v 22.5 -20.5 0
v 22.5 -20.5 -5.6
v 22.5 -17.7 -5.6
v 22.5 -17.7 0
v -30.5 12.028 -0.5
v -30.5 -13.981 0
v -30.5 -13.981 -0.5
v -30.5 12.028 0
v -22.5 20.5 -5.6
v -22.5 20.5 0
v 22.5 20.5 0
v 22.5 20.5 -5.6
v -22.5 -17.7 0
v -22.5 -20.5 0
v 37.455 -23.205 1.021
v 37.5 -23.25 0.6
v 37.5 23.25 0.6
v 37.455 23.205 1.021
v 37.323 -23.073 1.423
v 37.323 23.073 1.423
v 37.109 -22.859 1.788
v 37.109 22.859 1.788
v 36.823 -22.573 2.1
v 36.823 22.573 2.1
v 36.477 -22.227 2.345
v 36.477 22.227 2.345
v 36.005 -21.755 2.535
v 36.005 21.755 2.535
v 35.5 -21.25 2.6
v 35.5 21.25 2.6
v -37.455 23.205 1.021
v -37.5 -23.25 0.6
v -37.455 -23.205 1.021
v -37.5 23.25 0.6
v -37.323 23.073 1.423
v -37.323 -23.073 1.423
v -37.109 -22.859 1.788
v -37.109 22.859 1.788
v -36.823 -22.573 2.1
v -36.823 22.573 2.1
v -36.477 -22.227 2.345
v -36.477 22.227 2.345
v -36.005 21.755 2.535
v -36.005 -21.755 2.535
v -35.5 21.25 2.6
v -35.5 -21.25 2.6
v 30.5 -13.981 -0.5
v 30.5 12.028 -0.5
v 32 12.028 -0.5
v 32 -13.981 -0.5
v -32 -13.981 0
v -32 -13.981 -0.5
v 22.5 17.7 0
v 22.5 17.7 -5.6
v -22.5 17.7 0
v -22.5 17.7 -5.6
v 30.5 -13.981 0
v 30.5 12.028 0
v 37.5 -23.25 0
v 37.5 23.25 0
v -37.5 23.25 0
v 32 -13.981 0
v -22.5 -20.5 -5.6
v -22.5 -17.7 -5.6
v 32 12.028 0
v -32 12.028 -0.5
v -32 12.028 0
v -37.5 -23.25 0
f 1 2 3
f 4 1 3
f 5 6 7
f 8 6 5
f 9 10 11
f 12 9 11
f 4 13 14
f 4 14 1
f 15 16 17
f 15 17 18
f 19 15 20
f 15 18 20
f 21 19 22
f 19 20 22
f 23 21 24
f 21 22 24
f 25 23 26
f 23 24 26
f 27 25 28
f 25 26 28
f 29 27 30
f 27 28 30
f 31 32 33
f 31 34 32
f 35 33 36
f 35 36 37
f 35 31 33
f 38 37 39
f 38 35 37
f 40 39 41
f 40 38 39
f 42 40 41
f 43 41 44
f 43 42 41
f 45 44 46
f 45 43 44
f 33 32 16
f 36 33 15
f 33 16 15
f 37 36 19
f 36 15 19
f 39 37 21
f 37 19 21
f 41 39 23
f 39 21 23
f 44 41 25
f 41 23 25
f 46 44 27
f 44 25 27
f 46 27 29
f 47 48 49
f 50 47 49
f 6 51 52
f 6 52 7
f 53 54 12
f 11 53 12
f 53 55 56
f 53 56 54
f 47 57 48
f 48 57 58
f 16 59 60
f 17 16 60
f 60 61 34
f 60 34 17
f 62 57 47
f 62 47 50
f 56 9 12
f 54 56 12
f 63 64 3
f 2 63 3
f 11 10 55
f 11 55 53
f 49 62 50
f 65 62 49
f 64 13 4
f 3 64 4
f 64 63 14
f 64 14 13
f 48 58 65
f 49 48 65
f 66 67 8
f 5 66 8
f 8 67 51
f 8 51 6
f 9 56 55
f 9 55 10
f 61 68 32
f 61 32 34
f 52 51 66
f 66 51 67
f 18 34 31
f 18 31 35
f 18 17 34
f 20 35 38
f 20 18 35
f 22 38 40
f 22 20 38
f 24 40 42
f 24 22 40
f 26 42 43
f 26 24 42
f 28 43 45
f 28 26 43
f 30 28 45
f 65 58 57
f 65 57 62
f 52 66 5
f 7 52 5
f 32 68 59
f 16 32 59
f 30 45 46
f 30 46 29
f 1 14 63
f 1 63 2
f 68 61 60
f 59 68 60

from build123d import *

# Parameters (mm, degrees)
F0_W     = 75
F0_H     = 46.5
F0_W_2   = 1.5
F0_H_2   = 26.009672
F0_W_3   = 45
F0_H_3   = 2.8
F0_H_4   = 35.4
F1_DEPTH = 2.6
F2_DEPTH = 5.6
F3_DEPTH = 0.5
F4_R     = 2


with BuildPart() as f1:
    # F0 (on Top) → F1 (new body)
    with BuildSketch(Plane.XY):
        Rectangle(F0_W, F0_H)
        with Locations((-31.25, -0.976509)):
            Rectangle(F0_W_2, F0_H_2, mode=Mode.SUBTRACT)
        with Locations((31.25, -0.976509)):
            Rectangle(F0_W_2, F0_H_2, mode=Mode.SUBTRACT)
        Polygon((-22.5, 20.5), (22.5, 20.5), (22.5, 17.7), (22.5, -17.7), (22.5, -20.5), (-22.5, -20.5), (-22.5, -17.7), (-22.5, 17.7), align=None, mode=Mode.SUBTRACT)
        with Locations((-31.25, -0.976509)):
            Rectangle(F0_W_2, F0_H_2)
        with Locations((0, 19.1)):
            Rectangle(F0_W_3, F0_H_3)
        Rectangle(F0_W_3, F0_H_4)
        with Locations((0, -19.1)):
            Rectangle(F0_W_3, F0_H_3)
        with Locations((31.25, -0.976509)):
            Rectangle(F0_W_2, F0_H_2)
    extrude(amount=F1_DEPTH)

    # F4
    f4_edges = [f1.edges().sort_by_distance(p)[0] for p in [
        (37.5, 0, 2.6),
        (0, -23.25, 2.6),
        (0, 23.25, 2.6),
        (-37.5, 0, 2.6),
    ]]
    fillet(f4_edges, radius=F4_R)


with BuildPart() as f2:
    # F0 (on Top) → F2 (new body)
    with BuildSketch(Plane.XY):
        with Locations((0, -19.1)):
            Rectangle(F0_W_3, F0_H_3)
        with Locations((0, 19.1)):
            Rectangle(F0_W_3, F0_H_3)
    extrude(amount=-F2_DEPTH)


with BuildPart() as f3:
    # F0 (on Top) → F3 (new body)
    with BuildSketch(Plane.XY):
        with Locations((-31.25, -0.976509)):
            Rectangle(F0_W_2, F0_H_2)
        with Locations((31.25, -0.976509)):
            Rectangle(F0_W_2, F0_H_2)
    extrude(amount=-F3_DEPTH)


solid = Compound([f1.part, f2.part, f3.part])
